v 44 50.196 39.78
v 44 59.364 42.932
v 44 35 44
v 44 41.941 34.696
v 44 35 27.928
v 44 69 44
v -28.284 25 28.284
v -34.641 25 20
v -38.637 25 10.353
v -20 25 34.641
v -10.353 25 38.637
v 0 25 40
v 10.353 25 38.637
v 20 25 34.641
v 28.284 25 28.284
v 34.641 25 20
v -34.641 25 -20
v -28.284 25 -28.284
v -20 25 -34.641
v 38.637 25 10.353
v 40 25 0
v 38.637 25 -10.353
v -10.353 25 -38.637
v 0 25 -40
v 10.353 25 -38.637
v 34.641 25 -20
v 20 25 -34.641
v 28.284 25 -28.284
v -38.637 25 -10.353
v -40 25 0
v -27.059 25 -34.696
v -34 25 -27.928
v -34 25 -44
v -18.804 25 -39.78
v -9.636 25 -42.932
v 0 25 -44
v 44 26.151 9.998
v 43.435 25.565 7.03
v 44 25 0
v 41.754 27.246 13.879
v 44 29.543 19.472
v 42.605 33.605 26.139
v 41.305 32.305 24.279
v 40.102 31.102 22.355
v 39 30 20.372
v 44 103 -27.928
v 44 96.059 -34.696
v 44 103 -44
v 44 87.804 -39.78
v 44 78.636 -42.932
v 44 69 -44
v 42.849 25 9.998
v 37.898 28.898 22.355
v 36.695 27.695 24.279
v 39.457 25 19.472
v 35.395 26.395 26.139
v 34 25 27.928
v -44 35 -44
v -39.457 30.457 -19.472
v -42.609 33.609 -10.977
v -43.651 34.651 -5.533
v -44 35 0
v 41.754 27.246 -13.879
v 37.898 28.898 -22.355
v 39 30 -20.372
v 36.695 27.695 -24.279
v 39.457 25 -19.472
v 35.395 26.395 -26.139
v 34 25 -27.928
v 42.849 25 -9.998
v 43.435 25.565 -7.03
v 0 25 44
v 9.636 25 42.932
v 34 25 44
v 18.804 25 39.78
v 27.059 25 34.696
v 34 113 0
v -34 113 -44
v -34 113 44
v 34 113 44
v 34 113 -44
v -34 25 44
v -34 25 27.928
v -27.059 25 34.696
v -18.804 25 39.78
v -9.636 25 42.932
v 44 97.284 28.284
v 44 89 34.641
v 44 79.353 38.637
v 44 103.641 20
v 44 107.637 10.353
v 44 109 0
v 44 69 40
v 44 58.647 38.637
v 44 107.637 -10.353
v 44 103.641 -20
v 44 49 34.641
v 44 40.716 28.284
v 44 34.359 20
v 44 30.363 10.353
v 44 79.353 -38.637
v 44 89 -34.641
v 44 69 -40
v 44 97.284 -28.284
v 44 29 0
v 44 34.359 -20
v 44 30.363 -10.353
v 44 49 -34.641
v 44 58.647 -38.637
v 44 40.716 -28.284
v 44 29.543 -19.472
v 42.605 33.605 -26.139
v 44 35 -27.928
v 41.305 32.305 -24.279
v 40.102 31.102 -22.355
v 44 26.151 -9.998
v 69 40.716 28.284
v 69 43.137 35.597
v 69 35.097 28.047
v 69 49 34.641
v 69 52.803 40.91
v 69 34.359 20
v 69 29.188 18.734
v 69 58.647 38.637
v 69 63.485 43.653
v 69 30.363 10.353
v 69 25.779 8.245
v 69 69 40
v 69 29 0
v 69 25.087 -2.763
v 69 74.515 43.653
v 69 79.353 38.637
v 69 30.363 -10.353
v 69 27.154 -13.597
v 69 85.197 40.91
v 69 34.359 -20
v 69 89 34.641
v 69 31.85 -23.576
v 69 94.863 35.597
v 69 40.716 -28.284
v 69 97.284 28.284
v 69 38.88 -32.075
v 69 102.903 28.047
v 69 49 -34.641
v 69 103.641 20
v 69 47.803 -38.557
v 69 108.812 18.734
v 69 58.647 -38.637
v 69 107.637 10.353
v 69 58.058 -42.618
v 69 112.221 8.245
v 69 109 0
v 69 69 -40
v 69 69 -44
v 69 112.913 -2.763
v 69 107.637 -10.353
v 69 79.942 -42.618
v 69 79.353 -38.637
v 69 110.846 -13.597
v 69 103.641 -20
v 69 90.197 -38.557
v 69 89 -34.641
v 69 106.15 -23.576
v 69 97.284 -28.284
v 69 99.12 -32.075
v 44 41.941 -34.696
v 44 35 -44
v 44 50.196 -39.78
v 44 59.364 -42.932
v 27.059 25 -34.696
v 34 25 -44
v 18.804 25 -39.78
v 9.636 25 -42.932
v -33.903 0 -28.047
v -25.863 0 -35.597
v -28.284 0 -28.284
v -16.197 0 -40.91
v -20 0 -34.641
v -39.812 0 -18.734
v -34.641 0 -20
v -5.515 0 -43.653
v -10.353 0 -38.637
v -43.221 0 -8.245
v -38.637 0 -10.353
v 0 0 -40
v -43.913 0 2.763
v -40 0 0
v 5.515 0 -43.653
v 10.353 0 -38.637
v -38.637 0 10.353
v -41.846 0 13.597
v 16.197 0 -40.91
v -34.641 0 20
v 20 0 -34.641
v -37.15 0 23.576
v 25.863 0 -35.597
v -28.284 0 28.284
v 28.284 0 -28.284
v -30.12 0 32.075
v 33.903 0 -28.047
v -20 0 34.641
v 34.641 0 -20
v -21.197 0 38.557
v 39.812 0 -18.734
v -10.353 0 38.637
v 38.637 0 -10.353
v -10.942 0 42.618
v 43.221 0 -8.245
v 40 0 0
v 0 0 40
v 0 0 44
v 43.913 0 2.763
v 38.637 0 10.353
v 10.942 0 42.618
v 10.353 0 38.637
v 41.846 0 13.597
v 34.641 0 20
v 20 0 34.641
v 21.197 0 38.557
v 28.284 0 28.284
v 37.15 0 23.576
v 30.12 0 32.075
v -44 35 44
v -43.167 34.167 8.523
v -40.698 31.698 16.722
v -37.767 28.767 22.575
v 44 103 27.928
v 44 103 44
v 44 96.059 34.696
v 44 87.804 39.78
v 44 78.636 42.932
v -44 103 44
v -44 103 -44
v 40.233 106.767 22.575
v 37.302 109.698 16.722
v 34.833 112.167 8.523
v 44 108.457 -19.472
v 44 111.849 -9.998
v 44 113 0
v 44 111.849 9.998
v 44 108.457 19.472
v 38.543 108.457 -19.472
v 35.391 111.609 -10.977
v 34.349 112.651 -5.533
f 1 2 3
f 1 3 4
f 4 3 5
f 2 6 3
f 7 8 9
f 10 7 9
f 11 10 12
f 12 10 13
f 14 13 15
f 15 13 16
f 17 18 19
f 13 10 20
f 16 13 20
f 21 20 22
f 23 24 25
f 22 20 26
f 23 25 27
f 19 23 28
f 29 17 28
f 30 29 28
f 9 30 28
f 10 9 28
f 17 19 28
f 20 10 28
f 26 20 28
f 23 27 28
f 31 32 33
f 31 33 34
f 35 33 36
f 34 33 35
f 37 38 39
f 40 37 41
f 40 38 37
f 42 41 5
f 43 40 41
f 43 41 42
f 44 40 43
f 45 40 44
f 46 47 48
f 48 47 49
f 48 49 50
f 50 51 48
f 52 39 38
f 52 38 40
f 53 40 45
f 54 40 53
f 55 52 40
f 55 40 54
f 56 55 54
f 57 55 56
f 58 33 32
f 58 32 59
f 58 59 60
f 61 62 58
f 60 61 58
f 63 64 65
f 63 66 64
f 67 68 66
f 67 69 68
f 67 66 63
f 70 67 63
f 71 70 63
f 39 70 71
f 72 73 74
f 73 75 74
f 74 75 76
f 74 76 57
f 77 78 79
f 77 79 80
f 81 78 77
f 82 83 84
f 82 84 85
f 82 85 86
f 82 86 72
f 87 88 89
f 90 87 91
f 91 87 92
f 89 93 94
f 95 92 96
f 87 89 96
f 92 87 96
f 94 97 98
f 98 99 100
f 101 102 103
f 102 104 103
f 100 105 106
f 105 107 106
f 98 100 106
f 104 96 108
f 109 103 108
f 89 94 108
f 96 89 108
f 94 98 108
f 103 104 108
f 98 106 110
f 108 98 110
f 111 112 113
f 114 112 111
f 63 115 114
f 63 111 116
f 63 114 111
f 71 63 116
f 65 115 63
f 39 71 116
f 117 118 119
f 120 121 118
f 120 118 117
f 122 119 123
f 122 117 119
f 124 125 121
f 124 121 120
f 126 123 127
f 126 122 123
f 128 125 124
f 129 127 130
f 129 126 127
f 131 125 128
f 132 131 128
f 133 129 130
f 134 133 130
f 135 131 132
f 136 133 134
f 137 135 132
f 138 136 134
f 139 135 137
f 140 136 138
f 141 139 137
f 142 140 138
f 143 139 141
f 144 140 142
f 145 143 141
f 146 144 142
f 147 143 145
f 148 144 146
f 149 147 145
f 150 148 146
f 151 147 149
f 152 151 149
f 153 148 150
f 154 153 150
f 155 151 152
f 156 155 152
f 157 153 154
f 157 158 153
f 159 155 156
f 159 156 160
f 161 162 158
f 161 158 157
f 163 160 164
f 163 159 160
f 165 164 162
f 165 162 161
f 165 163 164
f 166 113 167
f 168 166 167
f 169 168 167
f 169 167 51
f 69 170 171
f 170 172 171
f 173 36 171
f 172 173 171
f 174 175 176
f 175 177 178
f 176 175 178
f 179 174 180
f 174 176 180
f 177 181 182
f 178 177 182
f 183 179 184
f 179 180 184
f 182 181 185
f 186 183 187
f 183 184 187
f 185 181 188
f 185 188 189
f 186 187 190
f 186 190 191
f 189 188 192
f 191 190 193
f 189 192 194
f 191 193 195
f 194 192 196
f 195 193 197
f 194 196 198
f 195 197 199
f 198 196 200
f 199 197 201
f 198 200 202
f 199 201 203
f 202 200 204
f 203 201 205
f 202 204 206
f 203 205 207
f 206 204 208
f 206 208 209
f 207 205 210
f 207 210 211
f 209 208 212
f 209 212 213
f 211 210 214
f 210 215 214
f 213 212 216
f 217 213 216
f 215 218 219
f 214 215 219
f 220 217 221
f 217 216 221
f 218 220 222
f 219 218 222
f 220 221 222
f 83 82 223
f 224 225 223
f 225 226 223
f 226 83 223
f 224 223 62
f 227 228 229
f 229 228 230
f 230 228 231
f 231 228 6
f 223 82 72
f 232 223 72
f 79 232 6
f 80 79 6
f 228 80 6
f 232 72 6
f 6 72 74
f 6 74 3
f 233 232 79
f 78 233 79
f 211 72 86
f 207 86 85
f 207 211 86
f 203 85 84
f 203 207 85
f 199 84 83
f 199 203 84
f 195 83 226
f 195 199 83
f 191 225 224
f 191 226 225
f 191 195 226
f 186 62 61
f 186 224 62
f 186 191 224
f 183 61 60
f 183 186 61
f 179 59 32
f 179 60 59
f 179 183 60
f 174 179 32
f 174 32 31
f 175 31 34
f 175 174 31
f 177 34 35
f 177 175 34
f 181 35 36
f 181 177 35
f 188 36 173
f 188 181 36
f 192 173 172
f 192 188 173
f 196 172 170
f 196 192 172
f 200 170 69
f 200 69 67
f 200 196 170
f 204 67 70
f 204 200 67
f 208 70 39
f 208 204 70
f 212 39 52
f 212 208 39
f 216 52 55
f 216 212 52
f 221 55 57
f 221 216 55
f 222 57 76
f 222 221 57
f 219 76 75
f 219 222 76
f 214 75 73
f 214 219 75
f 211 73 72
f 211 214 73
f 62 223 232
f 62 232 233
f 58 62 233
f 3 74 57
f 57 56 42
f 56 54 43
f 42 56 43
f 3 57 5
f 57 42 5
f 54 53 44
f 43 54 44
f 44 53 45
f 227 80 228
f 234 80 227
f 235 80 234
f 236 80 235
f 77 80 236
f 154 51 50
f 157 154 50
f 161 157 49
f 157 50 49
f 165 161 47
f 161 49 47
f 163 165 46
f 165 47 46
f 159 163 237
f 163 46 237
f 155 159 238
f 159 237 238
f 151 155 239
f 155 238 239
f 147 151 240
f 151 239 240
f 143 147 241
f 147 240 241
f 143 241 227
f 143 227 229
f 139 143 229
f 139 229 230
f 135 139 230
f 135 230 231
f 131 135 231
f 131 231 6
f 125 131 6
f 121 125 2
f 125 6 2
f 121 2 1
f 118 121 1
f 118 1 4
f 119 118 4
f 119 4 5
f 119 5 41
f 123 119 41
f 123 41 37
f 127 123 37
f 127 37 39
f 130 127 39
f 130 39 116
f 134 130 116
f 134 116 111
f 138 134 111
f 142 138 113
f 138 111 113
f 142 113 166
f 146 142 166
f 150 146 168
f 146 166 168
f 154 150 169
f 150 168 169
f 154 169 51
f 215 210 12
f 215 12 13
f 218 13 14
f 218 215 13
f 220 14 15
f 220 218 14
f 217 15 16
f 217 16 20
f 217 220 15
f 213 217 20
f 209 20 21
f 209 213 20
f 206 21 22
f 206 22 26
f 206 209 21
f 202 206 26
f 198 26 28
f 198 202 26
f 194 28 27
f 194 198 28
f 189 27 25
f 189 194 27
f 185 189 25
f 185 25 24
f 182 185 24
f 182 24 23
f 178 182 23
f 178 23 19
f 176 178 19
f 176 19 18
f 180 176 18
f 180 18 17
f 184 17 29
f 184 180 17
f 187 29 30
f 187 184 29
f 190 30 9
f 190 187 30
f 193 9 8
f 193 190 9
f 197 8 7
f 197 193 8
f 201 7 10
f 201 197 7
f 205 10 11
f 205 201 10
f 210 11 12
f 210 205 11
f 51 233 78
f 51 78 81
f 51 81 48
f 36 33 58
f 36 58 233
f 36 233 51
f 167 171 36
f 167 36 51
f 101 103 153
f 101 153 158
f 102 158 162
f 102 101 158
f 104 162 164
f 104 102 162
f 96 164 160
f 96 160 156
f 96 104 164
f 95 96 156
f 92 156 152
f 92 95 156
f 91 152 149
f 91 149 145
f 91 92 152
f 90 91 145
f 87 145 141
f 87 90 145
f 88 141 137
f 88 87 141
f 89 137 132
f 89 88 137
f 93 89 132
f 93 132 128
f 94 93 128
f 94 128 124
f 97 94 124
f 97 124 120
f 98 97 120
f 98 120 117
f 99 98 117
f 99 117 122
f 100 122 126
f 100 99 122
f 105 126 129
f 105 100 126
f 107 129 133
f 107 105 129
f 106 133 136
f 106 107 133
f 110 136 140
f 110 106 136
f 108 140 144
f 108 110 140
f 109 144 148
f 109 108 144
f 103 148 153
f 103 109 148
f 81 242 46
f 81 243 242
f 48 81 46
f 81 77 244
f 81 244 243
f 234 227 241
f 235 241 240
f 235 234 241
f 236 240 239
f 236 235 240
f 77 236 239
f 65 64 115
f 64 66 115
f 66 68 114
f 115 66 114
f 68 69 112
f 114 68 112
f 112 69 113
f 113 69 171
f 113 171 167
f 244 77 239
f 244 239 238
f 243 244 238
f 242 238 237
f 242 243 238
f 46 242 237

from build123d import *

# Parameters (mm, degrees)
SKETCH1_R           = 44
SKETCH1_R_2         = 40
BOSS_EXTRUDE1_DEPTH = 25
SKETCH2_R           = 44
SKETCH2_R_2         = 40
BOSS_EXTRUDE2_DEPTH = 25
SKETCH3_W           = 88
SKETCH3_H           = 88
BOSS_EXTRUDE3_DEPTH = 88
CHAMFER2_SIZE       = 10


with BuildPart() as part:
    # Sketch1 → Boss-Extrude1 (new body)
    with BuildSketch(Plane(origin=(0, 0, 0), x_dir=(1, 0, 0), z_dir=(0, 1, 0))):
        with Locations(Location((0, 0, 0), (0, 0, 270))):
            Circle(SKETCH1_R)
        with Locations(Location((0, 0, 0), (0, 0, 270))):
            Circle(SKETCH1_R_2, mode=Mode.SUBTRACT)
    extrude(amount=BOSS_EXTRUDE1_DEPTH)



with BuildPart() as body_2:
    # Sketch2 → Boss-Extrude2 (new body)
    with BuildSketch(Plane(origin=(44, 0, 0), x_dir=(0, 0, -1), z_dir=(1, 0, 0))):
        with Locations((0, 69)):
            Circle(SKETCH2_R)
        with Locations((0, 69)):
            Circle(SKETCH2_R_2, mode=Mode.SUBTRACT)
    extrude(amount=BOSS_EXTRUDE2_DEPTH)


with BuildPart() as part_1:
    add(part.part)

    add(body_2.part)  # Boss-Extrude3 merges body 2
    # Sketch3 → Boss-Extrude3 (add)
    with BuildSketch(Plane(origin=(0, 25, 0), x_dir=(1, 0, 0), z_dir=(0, 1, 0))):
        Rectangle(SKETCH3_W, SKETCH3_H)
    extrude(amount=BOSS_EXTRUDE3_DEPTH)

    # Chamfer2
    # the kernel refuses this chamfer: 10 mm, written as the material it takes off along each edge
    with BuildSketch(Plane(origin=(-44, 25, 8.9e-08), x_dir=(0.9996219169112968, -0.027495876610586317, 0), z_dir=(0, 0, -1))) as chamfer2_piece_1_section:
        Polygon((CHAMFER2_SIZE * 0.999621916911, -CHAMFER2_SIZE * 0.0274958766106), (-CHAMFER2_SIZE * 0.0274958766106, -CHAMFER2_SIZE * 0.999621916911), (0, 0), align=None)
    chamfer2_piece_1 = extrude(amount=69.716829969, mode=Mode.PRIVATE)
    chamfer2_piece_1 = chamfer2_piece_1 - Plane(origin=(0, 28.58171052, 0), x_dir=(0, 0, 1), z_dir=(0, -1, 0)) * Cylinder(44, 180, mode=Mode.PRIVATE)
    add(chamfer2_piece_1, mode=Mode.SUBTRACT)
    with BuildSketch(Plane(origin=(-44, 25, 69.71682988), x_dir=(0.9996219169112968, -0.027495876610586317, 0), z_dir=(0, 0, -1))) as chamfer2_piece_2_section:
        Polygon((CHAMFER2_SIZE * 0.999621916911, -CHAMFER2_SIZE * 0.0274958766106), (-CHAMFER2_SIZE * 0.0274958766106, -CHAMFER2_SIZE * 0.999621916911), (0, 0), align=None)
    chamfer2_piece_2 = extrude(amount=69.716829791, mode=Mode.PRIVATE)
    chamfer2_piece_2 = chamfer2_piece_2 - Plane(origin=(0, 28.58171052, 0), x_dir=(0, 0, 1), z_dir=(0, -1, 0)) * Cylinder(44, 180, mode=Mode.PRIVATE)
    add(chamfer2_piece_2, mode=Mode.SUBTRACT)
    with BuildSketch(Plane(origin=(44, 25, -1.49e-07), x_dir=(-0.9996219169112968, -0.027495876610586317, 0), z_dir=(0, 0, 1))) as chamfer2_piece_3_section:
        Polygon((CHAMFER2_SIZE * 0.999621916911, -CHAMFER2_SIZE * 0.0274958766106), (-CHAMFER2_SIZE * 0.0274958766106, -CHAMFER2_SIZE * 0.999621916911), (0, 0), align=None)
    chamfer2_piece_3 = extrude(amount=69.716830028, mode=Mode.PRIVATE)
    chamfer2_piece_3 = chamfer2_piece_3 - Plane(origin=(0, 28.146935755, 0), x_dir=(0, 0, 1), z_dir=(0, -1, 0)) * Cylinder(44, 180, mode=Mode.PRIVATE)
    chamfer2_piece_3 = chamfer2_piece_3 - Plane(origin=(40.853064245, 69, 0), x_dir=(0, 0, -1), z_dir=(-1, 0, 0)) * Cylinder(44, 180, mode=Mode.PRIVATE)
    add(chamfer2_piece_3, mode=Mode.SUBTRACT)
    with BuildSketch(Plane(origin=(44, 25, -69.71682988), x_dir=(-0.9996219169112968, -0.027495876610586317, 0), z_dir=(0, 0, 1))) as chamfer2_piece_4_section:
        Polygon((CHAMFER2_SIZE * 0.999621916911, -CHAMFER2_SIZE * 0.0274958766106), (-CHAMFER2_SIZE * 0.0274958766106, -CHAMFER2_SIZE * 0.999621916911), (0, 0), align=None)
    chamfer2_piece_4 = extrude(amount=69.716829731, mode=Mode.PRIVATE)
    chamfer2_piece_4 = chamfer2_piece_4 - Plane(origin=(0, 28.146935758, 0), x_dir=(0, 0, 1), z_dir=(0, -1, 0)) * Cylinder(44, 180, mode=Mode.PRIVATE)
    chamfer2_piece_4 = chamfer2_piece_4 - Plane(origin=(40.853064242, 69, 0), x_dir=(0, 0, -1), z_dir=(-1, 0, 0)) * Cylinder(44, 180, mode=Mode.PRIVATE)
    add(chamfer2_piece_4, mode=Mode.SUBTRACT)
    with BuildSketch(Plane(origin=(-44, 113, 69.71682988), x_dir=(-0.027495876610586317, -0.9996219169112968, 0), z_dir=(0, 0, -1))) as chamfer2_piece_5:
        Polygon((CHAMFER2_SIZE * 0.999621916911, -CHAMFER2_SIZE * 0.0274958766106), (-CHAMFER2_SIZE * 0.0274958766106, -CHAMFER2_SIZE * 0.999621916911), (0, 0), align=None)
    extrude(amount=139.433659759, mode=Mode.SUBTRACT)
    with BuildSketch(Plane(origin=(44, 113, -1.44e-07), x_dir=(-0.9996219169112968, 0.027495876610586317, 0), z_dir=(0, 0, 1))) as chamfer2_piece_6_section:
        Polygon((CHAMFER2_SIZE * 0.999621916911, CHAMFER2_SIZE * 0.0274958766106), (-CHAMFER2_SIZE * 0.0274958766106, CHAMFER2_SIZE * 0.999621916911), (0, 0), align=None)
    chamfer2_piece_6 = extrude(amount=69.716830024, mode=Mode.PRIVATE)
    chamfer2_piece_6 = chamfer2_piece_6 - Plane(origin=(40.41828948, 69, 0), x_dir=(0, 0, -1), z_dir=(-1, 0, 0)) * Cylinder(44, 180, mode=Mode.PRIVATE)
    add(chamfer2_piece_6, mode=Mode.SUBTRACT)
    with BuildSketch(Plane(origin=(44, 113, -69.71682988), x_dir=(-0.9996219169112968, 0.027495876610586317, 0), z_dir=(0, 0, 1))) as chamfer2_piece_7_section:
        Polygon((CHAMFER2_SIZE * 0.999621916911, CHAMFER2_SIZE * 0.0274958766106), (-CHAMFER2_SIZE * 0.0274958766106, CHAMFER2_SIZE * 0.999621916911), (0, 0), align=None)
    chamfer2_piece_7 = extrude(amount=69.716829736, mode=Mode.PRIVATE)
    chamfer2_piece_7 = chamfer2_piece_7 - Plane(origin=(40.41828948, 69, 0), x_dir=(0, 0, -1), z_dir=(-1, 0, 0)) * Cylinder(44, 180, mode=Mode.PRIVATE)
    add(chamfer2_piece_7, mode=Mode.SUBTRACT)


solid = part_1.part
